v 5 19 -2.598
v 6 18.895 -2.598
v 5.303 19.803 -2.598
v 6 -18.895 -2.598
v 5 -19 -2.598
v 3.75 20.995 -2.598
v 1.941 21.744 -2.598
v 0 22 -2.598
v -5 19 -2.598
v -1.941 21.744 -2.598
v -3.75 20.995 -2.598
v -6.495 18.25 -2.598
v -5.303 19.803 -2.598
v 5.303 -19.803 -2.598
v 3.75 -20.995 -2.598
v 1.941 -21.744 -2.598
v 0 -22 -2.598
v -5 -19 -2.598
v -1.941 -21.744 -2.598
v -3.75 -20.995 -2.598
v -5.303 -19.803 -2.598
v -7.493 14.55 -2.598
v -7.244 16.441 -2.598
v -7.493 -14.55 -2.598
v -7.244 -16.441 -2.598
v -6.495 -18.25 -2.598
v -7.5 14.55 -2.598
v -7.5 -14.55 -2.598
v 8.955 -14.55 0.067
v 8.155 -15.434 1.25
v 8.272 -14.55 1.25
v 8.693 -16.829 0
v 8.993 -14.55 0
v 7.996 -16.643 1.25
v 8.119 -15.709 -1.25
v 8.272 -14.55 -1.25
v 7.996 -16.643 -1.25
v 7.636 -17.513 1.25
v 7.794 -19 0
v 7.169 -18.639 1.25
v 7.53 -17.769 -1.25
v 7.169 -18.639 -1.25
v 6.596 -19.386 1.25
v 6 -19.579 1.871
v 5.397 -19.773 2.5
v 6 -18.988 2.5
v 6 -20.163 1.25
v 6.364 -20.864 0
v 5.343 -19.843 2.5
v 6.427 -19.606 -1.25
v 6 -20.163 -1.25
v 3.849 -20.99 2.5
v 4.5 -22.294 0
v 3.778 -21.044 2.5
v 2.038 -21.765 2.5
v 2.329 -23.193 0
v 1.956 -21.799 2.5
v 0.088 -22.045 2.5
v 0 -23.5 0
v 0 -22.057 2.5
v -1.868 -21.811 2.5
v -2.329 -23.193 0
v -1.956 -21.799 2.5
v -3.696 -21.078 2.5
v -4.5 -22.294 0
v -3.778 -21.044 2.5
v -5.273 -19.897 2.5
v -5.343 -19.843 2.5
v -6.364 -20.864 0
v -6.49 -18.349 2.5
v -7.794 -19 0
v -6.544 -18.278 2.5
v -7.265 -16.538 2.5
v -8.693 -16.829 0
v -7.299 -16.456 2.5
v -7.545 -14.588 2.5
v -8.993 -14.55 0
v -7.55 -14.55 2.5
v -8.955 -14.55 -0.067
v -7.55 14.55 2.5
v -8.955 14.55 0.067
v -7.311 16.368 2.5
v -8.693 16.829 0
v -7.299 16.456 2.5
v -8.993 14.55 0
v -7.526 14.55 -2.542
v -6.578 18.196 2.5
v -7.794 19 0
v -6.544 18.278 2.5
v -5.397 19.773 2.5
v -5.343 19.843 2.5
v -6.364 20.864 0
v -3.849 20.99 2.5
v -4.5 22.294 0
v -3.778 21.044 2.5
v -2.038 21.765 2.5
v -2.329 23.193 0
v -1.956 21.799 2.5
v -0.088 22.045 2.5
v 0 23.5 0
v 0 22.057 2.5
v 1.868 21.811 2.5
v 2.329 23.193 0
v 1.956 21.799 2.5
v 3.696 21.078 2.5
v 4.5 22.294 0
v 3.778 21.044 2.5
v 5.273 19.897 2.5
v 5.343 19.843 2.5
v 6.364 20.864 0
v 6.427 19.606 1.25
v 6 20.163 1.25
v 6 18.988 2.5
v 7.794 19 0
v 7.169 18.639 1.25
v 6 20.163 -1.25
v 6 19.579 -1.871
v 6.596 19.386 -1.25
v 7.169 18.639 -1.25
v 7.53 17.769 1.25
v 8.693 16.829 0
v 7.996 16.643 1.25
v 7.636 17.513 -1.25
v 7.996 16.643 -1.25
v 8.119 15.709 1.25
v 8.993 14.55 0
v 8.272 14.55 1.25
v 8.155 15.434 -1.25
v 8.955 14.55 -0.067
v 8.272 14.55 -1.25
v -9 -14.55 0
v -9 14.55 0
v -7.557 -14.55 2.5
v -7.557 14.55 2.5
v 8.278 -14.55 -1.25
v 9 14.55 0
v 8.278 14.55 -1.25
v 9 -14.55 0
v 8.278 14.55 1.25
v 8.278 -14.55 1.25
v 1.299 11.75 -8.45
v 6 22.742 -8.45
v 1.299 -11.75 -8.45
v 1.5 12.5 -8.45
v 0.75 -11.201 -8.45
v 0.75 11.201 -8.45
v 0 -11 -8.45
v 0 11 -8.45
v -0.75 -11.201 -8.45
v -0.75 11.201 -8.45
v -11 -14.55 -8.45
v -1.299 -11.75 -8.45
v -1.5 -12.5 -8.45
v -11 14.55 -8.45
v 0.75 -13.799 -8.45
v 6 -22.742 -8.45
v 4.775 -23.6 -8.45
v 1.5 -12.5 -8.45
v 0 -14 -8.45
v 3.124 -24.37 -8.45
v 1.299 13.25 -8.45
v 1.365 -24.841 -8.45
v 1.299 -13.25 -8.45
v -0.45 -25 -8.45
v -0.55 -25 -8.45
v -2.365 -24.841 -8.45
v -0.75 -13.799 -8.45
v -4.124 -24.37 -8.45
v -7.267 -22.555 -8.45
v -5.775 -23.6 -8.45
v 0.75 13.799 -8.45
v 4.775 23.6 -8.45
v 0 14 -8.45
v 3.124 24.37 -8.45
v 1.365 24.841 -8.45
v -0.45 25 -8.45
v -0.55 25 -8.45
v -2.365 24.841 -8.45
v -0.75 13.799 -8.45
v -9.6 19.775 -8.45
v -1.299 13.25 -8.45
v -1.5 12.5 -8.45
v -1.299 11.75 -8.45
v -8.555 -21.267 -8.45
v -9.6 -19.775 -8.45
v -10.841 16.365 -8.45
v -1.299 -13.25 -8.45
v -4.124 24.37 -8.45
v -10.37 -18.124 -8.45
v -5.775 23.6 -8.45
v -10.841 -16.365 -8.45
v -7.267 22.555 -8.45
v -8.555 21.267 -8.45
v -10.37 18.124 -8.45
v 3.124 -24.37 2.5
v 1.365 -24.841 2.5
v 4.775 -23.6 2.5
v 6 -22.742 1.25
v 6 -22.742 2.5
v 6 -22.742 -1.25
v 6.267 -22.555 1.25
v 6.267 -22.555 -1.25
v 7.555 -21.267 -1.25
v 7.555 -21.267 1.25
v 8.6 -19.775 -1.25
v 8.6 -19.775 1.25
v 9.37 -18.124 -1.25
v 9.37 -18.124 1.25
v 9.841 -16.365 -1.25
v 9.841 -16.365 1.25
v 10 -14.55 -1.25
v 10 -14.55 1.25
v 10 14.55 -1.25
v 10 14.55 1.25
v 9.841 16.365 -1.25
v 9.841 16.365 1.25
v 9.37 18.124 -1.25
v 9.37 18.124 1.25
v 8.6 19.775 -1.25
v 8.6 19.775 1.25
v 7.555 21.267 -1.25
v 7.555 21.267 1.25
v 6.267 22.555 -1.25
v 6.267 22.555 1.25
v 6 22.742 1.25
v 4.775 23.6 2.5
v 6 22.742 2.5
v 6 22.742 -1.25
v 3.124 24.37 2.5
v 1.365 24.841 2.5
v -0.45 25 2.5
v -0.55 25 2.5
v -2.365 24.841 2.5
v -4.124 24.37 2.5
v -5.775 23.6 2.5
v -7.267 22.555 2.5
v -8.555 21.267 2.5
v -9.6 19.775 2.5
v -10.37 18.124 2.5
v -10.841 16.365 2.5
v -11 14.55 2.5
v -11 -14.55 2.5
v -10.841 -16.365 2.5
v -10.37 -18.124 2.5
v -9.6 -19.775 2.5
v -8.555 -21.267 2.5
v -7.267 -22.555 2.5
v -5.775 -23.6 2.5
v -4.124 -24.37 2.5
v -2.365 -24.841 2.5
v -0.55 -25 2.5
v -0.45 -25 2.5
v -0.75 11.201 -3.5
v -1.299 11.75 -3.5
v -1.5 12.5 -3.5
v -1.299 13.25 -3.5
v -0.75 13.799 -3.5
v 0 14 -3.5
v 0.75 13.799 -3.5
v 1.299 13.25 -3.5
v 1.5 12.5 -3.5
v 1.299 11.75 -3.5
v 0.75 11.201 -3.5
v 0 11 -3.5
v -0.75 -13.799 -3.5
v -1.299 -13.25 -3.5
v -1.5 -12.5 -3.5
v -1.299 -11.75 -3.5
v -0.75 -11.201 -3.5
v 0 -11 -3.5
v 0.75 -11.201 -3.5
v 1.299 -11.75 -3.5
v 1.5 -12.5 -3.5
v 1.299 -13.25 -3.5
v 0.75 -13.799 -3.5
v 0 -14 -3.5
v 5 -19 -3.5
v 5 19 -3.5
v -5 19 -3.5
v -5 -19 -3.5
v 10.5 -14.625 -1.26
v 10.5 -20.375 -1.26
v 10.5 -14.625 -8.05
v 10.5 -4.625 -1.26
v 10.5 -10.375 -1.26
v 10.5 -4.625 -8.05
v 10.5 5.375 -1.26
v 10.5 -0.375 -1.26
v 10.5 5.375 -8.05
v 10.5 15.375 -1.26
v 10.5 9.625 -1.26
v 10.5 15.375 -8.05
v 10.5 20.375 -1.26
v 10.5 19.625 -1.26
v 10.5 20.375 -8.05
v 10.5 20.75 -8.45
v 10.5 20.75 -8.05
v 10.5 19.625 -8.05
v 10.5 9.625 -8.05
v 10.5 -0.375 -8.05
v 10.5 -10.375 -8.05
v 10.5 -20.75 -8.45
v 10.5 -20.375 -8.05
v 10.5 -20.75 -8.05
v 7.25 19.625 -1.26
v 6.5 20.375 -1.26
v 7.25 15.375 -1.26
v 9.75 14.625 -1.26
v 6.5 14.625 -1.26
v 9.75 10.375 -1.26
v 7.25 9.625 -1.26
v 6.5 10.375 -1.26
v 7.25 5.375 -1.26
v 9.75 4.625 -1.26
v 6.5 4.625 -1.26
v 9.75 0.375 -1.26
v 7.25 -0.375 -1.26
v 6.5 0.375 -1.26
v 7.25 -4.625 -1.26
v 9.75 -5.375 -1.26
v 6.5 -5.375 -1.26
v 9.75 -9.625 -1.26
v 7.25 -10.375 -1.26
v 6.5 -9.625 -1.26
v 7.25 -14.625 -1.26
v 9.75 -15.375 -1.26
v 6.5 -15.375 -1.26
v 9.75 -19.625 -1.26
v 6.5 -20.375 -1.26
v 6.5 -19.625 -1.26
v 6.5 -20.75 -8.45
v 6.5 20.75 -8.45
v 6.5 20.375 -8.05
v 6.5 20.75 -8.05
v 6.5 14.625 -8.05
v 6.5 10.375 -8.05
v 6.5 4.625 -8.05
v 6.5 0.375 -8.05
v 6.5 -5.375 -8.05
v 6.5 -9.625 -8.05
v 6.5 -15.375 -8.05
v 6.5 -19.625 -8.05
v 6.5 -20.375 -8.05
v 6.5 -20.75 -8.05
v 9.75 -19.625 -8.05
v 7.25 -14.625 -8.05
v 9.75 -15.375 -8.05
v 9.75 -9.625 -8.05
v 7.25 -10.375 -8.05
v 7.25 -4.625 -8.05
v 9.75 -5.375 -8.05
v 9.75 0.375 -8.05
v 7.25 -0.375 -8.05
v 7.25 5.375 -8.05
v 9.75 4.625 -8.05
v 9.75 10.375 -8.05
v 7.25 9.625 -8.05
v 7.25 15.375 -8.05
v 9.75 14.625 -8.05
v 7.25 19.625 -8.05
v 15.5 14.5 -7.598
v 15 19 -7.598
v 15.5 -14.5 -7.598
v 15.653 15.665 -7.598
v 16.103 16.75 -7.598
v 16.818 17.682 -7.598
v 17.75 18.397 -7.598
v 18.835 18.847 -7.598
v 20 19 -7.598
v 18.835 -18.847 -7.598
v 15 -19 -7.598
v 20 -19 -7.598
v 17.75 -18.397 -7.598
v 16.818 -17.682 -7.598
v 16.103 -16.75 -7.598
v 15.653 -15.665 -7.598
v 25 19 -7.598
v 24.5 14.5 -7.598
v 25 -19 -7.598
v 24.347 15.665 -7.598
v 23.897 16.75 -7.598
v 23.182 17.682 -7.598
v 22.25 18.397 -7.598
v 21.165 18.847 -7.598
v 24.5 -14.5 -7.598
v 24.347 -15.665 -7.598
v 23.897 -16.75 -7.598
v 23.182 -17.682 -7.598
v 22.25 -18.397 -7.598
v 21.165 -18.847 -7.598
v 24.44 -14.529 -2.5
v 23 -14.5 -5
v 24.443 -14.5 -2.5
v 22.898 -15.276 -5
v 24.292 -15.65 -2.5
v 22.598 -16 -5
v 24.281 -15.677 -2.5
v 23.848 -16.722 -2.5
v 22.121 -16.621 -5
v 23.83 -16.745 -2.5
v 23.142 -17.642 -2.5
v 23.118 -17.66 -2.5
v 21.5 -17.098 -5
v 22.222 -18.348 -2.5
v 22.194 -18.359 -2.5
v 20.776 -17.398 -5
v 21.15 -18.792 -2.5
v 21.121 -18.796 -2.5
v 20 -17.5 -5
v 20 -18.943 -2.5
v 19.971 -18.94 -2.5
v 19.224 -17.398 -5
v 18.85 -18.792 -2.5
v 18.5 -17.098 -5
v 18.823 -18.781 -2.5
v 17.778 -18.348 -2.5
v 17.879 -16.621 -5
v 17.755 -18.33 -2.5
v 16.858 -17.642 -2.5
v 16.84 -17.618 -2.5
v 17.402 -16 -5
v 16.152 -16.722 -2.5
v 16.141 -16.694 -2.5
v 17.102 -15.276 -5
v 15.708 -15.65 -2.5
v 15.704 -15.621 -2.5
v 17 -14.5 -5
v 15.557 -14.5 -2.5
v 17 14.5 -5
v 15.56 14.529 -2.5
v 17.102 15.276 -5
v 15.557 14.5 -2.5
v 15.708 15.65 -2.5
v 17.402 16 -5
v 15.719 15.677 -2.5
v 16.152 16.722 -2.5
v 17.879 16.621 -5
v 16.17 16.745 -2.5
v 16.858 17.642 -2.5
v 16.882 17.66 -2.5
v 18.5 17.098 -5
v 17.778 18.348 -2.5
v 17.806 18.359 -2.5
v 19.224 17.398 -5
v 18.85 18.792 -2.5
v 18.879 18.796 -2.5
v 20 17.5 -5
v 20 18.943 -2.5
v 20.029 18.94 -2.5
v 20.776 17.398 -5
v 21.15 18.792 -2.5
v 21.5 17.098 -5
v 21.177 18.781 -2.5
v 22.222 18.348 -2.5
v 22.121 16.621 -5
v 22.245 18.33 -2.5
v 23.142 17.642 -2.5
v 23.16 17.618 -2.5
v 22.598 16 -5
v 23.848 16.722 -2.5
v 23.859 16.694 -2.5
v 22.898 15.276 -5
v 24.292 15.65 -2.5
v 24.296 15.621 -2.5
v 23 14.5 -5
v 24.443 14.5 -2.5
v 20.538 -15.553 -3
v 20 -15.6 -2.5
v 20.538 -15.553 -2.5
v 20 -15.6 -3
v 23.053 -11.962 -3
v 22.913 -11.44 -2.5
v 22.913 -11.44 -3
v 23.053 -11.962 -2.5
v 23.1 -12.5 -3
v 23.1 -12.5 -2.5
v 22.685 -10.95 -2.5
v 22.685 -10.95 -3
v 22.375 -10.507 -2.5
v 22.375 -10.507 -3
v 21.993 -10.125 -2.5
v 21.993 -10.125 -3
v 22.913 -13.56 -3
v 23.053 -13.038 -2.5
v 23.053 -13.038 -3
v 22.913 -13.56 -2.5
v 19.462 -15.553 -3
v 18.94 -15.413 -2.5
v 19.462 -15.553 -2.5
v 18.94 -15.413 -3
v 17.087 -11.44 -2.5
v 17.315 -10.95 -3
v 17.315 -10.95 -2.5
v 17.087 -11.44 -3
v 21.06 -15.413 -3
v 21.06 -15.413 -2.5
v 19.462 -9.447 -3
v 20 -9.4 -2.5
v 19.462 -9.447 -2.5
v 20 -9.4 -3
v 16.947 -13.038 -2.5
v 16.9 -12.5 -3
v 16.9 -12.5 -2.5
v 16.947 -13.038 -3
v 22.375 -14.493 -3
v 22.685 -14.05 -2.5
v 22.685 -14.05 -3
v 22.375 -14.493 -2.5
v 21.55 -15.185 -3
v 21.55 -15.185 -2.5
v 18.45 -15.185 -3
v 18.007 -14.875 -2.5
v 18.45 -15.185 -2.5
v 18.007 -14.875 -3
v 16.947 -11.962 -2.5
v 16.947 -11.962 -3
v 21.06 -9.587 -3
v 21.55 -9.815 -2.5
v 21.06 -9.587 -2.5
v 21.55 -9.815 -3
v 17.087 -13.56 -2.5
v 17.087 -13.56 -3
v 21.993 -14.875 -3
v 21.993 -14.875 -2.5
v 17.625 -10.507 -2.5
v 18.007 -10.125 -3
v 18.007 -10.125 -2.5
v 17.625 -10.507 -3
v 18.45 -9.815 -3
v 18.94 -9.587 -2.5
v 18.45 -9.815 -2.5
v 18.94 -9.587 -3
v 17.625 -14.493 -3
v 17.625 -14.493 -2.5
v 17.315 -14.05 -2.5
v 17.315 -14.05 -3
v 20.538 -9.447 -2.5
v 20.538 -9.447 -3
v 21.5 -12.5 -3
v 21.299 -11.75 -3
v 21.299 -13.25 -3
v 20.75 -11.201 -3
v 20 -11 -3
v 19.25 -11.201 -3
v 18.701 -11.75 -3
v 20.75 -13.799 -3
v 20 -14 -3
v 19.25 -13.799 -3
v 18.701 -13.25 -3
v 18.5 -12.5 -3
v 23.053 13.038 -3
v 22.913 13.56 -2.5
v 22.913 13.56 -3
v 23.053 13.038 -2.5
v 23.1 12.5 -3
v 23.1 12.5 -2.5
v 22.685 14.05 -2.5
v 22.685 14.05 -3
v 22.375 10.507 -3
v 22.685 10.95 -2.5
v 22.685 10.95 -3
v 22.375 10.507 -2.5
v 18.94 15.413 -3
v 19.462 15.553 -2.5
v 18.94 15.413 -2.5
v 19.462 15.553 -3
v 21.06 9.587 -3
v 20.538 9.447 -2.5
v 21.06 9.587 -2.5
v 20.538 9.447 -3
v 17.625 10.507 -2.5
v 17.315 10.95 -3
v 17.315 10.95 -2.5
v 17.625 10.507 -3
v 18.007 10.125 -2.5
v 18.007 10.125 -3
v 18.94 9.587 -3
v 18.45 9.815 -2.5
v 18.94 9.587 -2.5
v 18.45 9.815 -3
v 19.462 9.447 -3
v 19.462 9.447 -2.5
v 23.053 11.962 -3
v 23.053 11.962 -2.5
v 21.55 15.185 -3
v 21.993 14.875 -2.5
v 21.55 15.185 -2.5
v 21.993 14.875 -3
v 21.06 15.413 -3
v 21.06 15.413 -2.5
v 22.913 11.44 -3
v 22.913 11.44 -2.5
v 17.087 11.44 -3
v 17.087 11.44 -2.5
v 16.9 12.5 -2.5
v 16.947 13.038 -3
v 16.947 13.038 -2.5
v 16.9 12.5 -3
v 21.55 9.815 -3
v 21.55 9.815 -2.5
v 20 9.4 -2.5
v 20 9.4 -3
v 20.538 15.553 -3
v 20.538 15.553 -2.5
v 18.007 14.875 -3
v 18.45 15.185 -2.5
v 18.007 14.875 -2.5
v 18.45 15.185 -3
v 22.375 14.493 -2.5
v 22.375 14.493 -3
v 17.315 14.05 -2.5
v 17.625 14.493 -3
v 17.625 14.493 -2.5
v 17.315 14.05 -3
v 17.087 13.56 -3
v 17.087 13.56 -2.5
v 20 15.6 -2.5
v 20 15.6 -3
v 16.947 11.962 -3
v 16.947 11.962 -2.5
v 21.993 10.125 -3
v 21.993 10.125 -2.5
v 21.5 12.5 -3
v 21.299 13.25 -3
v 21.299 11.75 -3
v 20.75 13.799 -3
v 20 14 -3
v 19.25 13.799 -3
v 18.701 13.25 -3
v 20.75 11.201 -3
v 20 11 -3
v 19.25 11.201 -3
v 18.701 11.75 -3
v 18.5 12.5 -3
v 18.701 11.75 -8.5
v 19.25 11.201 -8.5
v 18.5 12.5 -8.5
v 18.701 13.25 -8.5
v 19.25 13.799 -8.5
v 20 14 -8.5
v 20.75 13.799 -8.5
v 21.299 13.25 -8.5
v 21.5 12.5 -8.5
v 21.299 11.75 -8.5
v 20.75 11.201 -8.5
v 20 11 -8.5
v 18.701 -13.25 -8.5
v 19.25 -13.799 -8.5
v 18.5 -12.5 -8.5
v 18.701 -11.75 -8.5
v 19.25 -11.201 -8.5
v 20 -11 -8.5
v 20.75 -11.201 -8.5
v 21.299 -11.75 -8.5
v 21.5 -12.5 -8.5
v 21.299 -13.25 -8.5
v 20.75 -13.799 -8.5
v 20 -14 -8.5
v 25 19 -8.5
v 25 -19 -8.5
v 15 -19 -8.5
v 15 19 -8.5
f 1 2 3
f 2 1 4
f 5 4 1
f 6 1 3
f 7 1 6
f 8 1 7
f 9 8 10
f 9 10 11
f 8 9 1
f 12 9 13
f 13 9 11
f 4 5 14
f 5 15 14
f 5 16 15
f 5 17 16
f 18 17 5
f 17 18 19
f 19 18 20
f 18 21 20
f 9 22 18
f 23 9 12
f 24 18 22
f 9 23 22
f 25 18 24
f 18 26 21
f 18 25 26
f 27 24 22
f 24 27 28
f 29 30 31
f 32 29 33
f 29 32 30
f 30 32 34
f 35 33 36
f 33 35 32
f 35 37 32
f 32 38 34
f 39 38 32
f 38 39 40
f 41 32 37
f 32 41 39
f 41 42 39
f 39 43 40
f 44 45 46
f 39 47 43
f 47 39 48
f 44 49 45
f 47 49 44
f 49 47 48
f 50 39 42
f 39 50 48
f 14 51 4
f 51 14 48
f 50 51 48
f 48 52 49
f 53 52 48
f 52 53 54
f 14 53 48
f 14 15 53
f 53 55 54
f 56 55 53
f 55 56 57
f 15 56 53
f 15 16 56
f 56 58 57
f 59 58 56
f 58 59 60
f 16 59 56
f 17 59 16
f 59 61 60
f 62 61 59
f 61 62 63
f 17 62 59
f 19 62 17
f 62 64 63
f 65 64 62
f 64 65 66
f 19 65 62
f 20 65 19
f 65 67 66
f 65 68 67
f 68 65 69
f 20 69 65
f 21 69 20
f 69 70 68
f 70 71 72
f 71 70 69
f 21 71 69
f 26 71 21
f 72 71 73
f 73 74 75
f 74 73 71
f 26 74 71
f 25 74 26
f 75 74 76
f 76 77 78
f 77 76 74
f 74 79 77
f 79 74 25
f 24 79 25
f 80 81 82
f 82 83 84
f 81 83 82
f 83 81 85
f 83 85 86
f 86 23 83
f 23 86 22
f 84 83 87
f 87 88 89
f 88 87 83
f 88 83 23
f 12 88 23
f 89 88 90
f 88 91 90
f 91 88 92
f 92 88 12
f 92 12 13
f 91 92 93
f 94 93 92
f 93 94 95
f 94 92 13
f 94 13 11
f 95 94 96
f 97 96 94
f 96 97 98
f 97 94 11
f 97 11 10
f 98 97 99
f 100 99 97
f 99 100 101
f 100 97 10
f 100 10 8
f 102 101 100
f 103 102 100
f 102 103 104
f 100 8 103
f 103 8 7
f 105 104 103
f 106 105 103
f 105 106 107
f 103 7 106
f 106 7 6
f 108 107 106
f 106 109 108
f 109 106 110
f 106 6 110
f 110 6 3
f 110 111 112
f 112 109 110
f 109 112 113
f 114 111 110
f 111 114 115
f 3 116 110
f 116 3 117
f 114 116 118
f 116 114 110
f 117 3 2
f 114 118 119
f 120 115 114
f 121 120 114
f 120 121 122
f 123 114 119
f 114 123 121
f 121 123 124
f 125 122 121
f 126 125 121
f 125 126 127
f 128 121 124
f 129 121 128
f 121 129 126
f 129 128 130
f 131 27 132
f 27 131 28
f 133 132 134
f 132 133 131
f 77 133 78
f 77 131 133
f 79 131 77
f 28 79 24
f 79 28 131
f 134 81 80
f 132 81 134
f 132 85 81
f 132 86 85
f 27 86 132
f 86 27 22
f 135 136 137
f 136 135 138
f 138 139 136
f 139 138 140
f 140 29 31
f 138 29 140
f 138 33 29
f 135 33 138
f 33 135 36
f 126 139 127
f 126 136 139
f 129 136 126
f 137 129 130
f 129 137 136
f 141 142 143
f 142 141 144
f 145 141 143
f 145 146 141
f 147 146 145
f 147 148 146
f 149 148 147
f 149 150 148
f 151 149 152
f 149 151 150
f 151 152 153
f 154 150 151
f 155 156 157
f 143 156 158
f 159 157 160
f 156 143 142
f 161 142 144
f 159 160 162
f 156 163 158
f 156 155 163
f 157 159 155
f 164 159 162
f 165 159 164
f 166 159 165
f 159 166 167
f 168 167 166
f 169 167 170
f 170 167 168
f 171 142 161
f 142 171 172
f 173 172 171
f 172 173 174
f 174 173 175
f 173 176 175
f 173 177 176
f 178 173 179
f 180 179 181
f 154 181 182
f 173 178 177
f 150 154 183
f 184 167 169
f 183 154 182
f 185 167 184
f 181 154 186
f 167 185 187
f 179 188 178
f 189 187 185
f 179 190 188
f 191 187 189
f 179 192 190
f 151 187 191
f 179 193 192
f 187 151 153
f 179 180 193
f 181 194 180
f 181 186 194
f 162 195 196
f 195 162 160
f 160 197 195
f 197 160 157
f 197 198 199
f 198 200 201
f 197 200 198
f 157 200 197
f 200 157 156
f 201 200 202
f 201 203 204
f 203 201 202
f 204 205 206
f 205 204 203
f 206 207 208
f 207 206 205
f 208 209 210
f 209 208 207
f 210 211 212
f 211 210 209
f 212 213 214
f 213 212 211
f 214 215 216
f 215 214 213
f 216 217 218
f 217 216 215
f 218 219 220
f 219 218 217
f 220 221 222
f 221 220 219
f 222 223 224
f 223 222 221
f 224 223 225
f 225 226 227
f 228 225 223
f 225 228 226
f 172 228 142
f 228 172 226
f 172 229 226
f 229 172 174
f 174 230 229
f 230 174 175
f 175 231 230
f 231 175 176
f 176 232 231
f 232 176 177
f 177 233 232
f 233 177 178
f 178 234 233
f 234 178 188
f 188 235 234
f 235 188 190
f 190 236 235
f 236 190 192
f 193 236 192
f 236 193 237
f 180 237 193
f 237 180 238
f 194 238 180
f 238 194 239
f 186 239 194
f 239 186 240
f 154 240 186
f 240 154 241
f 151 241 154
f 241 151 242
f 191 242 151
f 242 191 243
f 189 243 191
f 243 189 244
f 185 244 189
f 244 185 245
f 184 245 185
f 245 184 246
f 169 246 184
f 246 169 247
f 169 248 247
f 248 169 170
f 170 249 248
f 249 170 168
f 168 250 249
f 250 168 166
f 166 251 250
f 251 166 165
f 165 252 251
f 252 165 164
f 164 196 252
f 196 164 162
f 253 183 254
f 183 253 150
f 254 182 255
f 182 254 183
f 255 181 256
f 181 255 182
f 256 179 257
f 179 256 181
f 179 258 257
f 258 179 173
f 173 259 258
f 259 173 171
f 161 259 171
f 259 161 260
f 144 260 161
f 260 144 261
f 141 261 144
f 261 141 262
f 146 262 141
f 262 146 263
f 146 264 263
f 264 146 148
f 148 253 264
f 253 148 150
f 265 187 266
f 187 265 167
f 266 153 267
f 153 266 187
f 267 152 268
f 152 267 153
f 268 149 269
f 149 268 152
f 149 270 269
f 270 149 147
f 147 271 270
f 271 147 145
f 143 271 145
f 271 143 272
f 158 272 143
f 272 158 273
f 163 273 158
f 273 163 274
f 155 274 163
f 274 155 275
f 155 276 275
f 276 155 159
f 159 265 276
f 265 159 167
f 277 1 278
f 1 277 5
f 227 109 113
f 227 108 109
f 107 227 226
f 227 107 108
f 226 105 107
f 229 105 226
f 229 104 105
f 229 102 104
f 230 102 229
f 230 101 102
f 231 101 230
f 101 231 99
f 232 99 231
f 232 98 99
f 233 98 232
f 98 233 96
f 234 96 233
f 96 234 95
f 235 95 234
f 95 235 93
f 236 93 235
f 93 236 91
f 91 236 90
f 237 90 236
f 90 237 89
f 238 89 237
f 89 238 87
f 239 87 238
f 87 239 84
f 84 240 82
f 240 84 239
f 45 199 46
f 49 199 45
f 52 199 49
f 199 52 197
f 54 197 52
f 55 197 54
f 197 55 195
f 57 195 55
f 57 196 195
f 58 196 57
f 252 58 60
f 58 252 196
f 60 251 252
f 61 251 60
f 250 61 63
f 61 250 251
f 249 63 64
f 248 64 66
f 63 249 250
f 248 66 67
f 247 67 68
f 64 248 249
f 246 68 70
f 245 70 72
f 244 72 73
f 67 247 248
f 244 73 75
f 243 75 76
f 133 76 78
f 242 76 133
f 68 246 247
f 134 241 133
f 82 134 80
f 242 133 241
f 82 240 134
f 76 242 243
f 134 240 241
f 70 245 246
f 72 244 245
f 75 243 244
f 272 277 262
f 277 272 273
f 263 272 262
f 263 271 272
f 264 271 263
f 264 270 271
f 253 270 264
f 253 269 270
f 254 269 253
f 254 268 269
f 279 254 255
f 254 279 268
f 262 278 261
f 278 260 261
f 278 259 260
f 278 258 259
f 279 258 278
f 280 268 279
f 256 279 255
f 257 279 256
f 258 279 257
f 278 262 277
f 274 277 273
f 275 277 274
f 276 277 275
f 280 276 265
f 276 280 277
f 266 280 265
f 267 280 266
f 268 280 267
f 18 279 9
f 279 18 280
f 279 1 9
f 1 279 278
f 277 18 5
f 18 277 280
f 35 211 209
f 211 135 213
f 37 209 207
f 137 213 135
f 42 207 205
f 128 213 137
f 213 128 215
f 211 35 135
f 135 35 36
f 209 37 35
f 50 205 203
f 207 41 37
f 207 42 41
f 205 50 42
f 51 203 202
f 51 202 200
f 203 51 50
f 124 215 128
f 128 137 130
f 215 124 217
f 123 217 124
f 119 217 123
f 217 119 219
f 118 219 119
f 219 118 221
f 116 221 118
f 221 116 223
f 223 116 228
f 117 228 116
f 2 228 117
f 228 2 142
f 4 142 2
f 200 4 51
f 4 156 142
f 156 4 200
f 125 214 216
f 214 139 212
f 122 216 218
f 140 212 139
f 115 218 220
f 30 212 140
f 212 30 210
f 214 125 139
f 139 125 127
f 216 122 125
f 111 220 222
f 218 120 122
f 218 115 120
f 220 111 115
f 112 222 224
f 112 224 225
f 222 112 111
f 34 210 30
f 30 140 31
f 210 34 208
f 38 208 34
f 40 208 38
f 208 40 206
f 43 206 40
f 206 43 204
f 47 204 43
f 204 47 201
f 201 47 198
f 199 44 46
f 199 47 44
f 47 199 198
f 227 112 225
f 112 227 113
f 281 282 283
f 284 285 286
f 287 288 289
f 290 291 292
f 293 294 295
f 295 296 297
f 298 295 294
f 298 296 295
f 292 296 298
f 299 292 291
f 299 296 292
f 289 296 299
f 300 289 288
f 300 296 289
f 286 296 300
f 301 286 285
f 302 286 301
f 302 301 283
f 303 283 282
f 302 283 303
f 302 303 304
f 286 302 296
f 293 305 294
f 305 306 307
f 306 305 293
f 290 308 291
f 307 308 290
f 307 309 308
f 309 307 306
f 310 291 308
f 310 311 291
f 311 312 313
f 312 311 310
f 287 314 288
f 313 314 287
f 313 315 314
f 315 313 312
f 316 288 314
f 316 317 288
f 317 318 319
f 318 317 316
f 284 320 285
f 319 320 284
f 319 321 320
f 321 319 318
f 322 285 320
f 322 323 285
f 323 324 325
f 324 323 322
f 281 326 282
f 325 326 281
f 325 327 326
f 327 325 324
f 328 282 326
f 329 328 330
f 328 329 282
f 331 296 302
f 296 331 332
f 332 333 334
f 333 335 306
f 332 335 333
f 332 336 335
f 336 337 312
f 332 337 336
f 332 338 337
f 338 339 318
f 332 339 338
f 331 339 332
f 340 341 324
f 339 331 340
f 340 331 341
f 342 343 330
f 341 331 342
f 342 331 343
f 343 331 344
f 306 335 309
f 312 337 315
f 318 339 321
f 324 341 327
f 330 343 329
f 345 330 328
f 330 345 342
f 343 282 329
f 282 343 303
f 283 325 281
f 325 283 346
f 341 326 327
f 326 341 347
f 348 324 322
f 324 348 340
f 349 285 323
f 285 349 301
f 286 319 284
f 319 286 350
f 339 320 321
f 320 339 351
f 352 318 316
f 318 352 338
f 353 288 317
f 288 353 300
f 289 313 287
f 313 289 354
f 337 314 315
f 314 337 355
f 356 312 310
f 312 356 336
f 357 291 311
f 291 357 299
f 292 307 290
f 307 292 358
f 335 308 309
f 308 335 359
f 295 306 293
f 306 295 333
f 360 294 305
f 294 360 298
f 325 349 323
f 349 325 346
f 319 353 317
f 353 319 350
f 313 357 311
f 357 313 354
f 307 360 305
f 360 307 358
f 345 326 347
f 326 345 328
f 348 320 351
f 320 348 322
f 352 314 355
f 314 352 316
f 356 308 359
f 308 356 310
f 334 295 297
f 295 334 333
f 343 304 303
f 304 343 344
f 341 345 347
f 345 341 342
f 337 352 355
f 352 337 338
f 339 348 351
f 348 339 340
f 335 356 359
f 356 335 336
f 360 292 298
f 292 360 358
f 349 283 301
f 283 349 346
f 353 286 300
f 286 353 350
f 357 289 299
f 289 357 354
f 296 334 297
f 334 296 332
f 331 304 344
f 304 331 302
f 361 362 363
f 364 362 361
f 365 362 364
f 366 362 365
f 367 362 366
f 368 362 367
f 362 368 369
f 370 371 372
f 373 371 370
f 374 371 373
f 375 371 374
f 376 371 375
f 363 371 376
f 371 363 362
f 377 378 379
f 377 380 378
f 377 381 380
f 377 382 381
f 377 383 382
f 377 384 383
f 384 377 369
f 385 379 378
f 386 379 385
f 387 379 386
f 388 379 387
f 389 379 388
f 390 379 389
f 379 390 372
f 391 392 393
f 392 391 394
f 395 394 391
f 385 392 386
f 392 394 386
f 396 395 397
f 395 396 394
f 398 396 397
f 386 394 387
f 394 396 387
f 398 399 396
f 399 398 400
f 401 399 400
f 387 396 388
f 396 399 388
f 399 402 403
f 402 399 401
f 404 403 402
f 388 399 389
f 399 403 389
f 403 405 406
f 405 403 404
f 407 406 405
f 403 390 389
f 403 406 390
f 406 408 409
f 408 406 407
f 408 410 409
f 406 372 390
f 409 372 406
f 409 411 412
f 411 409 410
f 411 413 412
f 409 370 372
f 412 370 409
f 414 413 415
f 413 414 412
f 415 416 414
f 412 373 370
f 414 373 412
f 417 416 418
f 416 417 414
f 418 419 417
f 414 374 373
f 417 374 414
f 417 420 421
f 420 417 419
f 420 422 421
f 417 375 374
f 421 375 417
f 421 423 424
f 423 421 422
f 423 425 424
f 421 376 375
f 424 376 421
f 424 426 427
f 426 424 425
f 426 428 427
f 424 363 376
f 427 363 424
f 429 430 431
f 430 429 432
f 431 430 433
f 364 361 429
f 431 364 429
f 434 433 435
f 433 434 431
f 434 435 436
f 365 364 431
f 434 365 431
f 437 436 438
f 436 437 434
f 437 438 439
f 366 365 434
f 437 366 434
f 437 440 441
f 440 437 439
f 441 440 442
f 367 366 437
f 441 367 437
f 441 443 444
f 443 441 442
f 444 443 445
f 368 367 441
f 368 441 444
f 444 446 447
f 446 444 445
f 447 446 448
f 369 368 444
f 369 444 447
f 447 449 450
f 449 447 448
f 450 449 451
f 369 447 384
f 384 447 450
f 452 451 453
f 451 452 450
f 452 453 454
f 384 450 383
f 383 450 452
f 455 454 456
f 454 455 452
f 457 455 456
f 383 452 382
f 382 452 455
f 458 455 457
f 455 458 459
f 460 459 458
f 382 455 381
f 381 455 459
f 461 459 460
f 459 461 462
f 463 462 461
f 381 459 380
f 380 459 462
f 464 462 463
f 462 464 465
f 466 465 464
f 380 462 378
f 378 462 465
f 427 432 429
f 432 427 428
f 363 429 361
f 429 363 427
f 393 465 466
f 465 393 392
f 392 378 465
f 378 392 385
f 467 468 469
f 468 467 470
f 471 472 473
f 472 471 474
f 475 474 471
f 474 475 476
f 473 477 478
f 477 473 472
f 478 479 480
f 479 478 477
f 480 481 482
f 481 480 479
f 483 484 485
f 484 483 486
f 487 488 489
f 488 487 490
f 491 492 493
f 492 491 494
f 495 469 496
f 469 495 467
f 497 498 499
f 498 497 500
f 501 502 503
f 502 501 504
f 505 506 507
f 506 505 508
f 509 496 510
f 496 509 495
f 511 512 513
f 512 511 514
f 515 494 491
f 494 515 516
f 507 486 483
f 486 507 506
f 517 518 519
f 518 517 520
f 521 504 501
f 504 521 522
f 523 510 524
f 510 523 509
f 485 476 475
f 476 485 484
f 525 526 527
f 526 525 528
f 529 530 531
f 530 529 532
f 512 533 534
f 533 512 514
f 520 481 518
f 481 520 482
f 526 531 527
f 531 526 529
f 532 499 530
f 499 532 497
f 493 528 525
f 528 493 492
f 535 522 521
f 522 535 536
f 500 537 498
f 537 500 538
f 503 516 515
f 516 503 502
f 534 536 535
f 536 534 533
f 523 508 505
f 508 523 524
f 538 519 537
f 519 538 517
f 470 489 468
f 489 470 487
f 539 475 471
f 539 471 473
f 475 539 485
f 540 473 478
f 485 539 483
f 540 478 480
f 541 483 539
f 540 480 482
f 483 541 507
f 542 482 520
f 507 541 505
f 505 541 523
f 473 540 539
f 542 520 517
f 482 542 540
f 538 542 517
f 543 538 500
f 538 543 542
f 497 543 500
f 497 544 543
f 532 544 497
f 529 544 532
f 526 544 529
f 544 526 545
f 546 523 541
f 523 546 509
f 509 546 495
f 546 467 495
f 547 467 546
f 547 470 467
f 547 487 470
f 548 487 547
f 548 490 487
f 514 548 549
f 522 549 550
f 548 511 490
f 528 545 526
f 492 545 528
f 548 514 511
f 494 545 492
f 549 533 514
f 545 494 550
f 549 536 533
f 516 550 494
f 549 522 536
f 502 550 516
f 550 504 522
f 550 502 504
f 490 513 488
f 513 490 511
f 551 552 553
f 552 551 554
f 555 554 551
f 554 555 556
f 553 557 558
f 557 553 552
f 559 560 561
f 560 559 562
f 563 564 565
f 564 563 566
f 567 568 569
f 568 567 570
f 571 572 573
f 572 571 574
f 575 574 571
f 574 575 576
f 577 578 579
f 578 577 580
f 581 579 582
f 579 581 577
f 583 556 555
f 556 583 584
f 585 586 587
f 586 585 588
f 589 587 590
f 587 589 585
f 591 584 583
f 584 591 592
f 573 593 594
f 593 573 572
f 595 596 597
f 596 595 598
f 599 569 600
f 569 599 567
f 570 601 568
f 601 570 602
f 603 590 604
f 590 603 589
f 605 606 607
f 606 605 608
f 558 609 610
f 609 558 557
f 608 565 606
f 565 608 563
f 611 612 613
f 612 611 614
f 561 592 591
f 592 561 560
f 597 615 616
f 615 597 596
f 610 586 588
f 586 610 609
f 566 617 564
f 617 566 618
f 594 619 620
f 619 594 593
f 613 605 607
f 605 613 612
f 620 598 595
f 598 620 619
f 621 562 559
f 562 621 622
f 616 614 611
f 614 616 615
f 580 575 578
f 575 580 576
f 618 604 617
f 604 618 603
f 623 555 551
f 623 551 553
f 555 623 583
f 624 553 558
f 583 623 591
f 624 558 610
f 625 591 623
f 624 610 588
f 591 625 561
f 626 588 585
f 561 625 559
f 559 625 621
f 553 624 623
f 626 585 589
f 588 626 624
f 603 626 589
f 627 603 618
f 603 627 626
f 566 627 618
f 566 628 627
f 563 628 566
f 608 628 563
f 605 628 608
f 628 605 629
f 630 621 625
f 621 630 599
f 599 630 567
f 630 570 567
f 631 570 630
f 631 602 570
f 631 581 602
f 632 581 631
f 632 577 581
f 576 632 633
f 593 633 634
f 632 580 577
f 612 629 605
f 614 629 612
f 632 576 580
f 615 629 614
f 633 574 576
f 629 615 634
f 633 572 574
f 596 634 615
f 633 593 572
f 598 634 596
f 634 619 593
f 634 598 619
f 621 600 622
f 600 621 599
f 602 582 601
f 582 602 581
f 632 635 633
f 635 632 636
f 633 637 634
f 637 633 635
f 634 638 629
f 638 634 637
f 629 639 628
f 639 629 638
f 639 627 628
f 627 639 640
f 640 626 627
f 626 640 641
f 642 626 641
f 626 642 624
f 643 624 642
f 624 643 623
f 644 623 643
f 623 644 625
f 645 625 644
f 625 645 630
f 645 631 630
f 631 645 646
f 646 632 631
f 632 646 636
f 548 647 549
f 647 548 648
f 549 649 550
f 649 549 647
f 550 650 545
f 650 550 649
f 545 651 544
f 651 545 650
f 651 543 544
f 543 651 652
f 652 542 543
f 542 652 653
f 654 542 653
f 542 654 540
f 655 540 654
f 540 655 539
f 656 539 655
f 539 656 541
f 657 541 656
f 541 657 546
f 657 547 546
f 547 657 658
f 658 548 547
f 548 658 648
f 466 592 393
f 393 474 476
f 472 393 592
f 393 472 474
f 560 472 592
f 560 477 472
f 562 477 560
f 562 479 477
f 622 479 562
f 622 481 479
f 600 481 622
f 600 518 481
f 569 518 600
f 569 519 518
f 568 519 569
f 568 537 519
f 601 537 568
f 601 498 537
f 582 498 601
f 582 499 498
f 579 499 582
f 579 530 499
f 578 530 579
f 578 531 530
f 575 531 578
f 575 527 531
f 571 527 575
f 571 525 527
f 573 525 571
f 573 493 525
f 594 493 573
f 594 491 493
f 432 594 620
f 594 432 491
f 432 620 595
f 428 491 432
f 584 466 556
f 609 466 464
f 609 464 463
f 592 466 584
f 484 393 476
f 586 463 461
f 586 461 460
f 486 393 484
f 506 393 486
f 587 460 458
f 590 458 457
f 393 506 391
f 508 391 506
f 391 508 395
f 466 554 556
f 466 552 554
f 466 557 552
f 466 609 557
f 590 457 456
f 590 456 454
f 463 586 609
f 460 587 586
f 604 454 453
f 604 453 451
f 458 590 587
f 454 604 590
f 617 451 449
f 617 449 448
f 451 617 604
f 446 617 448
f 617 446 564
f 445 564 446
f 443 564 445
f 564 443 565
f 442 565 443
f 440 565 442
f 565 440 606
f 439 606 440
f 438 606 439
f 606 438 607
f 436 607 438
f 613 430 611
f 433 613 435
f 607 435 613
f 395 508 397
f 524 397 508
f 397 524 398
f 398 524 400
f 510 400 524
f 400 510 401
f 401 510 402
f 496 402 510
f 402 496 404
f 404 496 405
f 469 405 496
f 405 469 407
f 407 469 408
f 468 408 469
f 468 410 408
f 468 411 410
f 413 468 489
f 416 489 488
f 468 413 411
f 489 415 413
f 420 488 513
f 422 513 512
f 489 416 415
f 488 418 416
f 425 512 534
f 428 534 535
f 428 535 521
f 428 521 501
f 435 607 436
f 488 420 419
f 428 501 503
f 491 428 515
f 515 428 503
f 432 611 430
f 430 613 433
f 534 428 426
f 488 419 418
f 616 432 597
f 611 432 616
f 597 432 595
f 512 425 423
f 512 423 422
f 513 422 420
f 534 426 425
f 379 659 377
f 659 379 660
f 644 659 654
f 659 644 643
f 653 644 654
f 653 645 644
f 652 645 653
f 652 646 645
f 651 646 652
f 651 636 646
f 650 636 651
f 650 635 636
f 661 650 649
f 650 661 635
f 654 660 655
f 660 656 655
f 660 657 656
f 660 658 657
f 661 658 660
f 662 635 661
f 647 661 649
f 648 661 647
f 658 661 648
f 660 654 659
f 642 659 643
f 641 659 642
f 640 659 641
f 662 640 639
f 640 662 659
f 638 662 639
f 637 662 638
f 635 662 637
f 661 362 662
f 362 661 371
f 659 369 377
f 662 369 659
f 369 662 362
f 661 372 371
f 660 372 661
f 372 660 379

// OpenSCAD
// file: recirculating_mw.scad
//include </home/markw/Dropbox/3Dmodels/MCAD/nuts_and_bolts.scad>

length = 50;
thickness = 11;
channel_radius = 3;
track_radius = 6;
outside_radius = channel_radius + track_radius + 1.5;
slot = 2.5;

module track(h) {
  union() {
    translate([0, outside_radius-length/2, 0]) intersection() {
      rotate_extrude($fn=24) translate([track_radius, 0, 0])
        circle(r=channel_radius, $fn=6);
      translate([0, -20, 0]) cube([40, 40, 40], center=true);
    }
    translate([0, length/2-outside_radius, 0]) intersection() {
      rotate_extrude($fn=24) translate([track_radius, 0, 0])
        circle(r=channel_radius, $fn=6);
      translate([0, 20, 0]) cube([40, 40, 40], center=true);
    }
    for (s = [-1, 1]) {
      scale([s, 1, 1])
        translate([track_radius, 0, 0]) rotate([90, 0, 0]) {
          cylinder(r=channel_radius,
                   h=length-2*outside_radius+0.1,
                   center=true, $fn=6);
          translate([0, 2, 0]) #
            cylinder(r=channel_radius*0.61,
                     h=length-2*outside_radius+0.1,
                     center=true, $fn=6);
      }
    }
  }
}

module half() {
  difference() {
    translate([0, 0, slot/2-thickness+1.3])
    linear_extrude(height=30, convexity=2) {
      difference() {
        translate([-0.5, 0, 0]) minkowski() {
          square([0.1, 0.1+length-2*outside_radius], center=true);
          circle(r=outside_radius-0.05, $fn=36);
        }
        for (y = [2+outside_radius-length/2,
                  length/2-outside_radius-2]) {
          translate([0, y])
            circle(r=1.5, $fn=12);
        }
      }
    }
    track();
    translate([-10.5, 0, 12.5])
      cube([100, 100, 20], center=true);
    translate([0, 0, 10]) rotate([0, -90, 0]) {
      rotate([0, 0, 90]) cylinder(r=3.2, h=50, $fn=6);
      cylinder(r=1.7, h=50, center=true, $fn=12);
    }
    translate([10+track_radius, 0, -10-slot/2])
      cube([20, length, 20], center=true);
    translate([10+track_radius, 0, 10+slot/2])
      cube([20, length, 20], center=true);
    // recesses for bolt heads
    assign(bhr = 1)
    for (y = [2+outside_radius-length/2,
              length/2-outside_radius-2]) {
      translate([0, y, 3-bhr])
        cylinder(r=3.1, h=bhr, $fn=36);
    }
  }
}

channelHeight = -1 + 2 * channel_radius;
cutDepth = 1;

module inner_half() {
    translate([0, 0, -5])
    intersection() {
        half();
        // remove inner part of track to eliminate travel moves
        translate([0, 0, -cutDepth/2])
          cube([10, 38, channelHeight+cutDepth], center=true);
    }
}

module outer_half() {
  difference() {
    translate([0, 0, slot/2-thickness+1.3])
    linear_extrude(height=30, convexity=2) {
      difference() {
        translate([-0.5, 0, 0]) minkowski() {
          square([0.1, 0.1+length-2*outside_radius], center=true);
          circle(r=outside_radius-0.05, $fn=36);
        }
        for (y = [2+outside_radius-length/2,
                  length/2-outside_radius-2]) {
          translate([0, y])
            circle(r=1.5, $fn=12);
        }
      }
    }
    track();

    // remove inner part of track to eliminate travel moves
    translate([0, 0, -cutDepth/2])
      cube([10, 38, channelHeight+cutDepth], center=true);
      
    translate([-10.5, 0, 12.5])
      cube([100, 100, 20], center=true);
    translate([0, 0, 10]) rotate([0, -90, 0]) {
      rotate([0, 0, 90]) cylinder(r=3.2, h=50, $fn=6);
      cylinder(r=1.7, h=50, center=true, $fn=12);
    }
    translate([10+track_radius, 0, -10-slot/2])
      cube([20, length, 20], center=true);
    translate([10+track_radius, 0, 10+slot/2])
      cube([20, length, 20], center=true);
    // recesses for bolt heads
    assign(bhr = 1)
    for (y = [2+outside_radius-length/2,
              length/2-outside_radius-2]) {
      translate([0, y, 3-bhr])
        cylinder(r=3.1, h=bhr, $fn=36);
    }
  }
}

module recirc_plate(bearing_offset, recess=0.5) {
    width = 42;
    height = 42;
    thickness = 12;
    sdepth = 9;
    slotwidth = 1;
    soffset = (bearing_offset-10)/2;
    tdepth = .4 * sdepth;
    tol = 0.25;
    cutout = 10;
    difference() {
        // locate top face of plate at z=0
        translate([0,0,-thickness/2])
            cube([width, height, thickness], center=true);
        // cut slots for tensioning adjustment
        translate([bearing_offset-soffset,0,-sdepth/2])
            cube([slotwidth, height, sdepth], center=true);
        translate([-bearing_offset+soffset,0,-sdepth/2])
            cube([slotwidth, height, sdepth], center=true);
        // shave recess off center section
        translate([0,0,-recess/2])
            cube([2*(bearing_offset-soffset), height, recess], center=true);
        // hollow out center section 
        translate([0,0,-(sdepth-2)/2])
            cube([cutout, (height-6), sdepth-2], center=true);
        // carriage mounting holes (clearance)
        for(xoff=[-10,10]) {
            for(yoff=[-10,10]) {
                // M3 bolt
                translate([xoff, yoff, -thickness])
                    cylinder(r=1.5, h=thickness, $fn=36);
                // M3 nut
                translate([xoff, yoff, -sdepth]) rotate([0,0,30])
                    cylinder(r=3+tol, h=thickness, $fn=6);
            }
        }
        // recirc bearing mtg holes (clearance M3)
        for(xoff=[-bearing_offset, bearing_offset]) {
            for(yoff=[-12.5, 12.5]) {
                // .5 mm thick bridge at bottom of hole must be drilled out
                translate([xoff, yoff, 3.5-thickness])
                    cylinder(r=1.5, h=thickness, $fn=36);
                // M3 nut
                translate([xoff, yoff, -thickness])
                    cylinder(r=3+tol, h=2.5, $fn=6);
            }
        }
        // tensioning screw 
        // nuts (tolerance is added to radius of nuts)
        translate([-1.9-cutout/2, 0, -tdepth]) rotate([0, 90, 0]) rotate([0, 0, 30])
            cylinder(r=3+tol, h=2, $fn=6);
        translate([-.1+cutout/2, 0, -tdepth]) rotate([0, 90, 0]) rotate([0, 0, 30])
            cylinder(r=3+tol, h=2, $fn=6);
        // bolts
        translate([0, 0, -tdepth]) rotate([0, 90, 0])
            cylinder(r=3/2, h=width+2, $fn=36, center=true);
    }
}

module recirc_half() {
    outer_half();
    
    // support
    swid = 4;
    stk = 0.75;
    soff = 6.5;
    gap = 0.01;
    shgt = thickness-slot-1.3-gap;
    
    echo("recirc bearing bottom z offset:", -gap-shgt-slot/2);
    
    translate([soff+swid/2, 0, .2-gap-shgt-slot/2]) 
        cube([swid, 40+2*stk, .4], center=true);
        
    for (y = [-20: 5: 20]) {
        translate([soff+swid/2, y, -gap-(shgt+slot)/2]) 
            cube([swid, stk, shgt], center=true);
    }
    for (y = [-15: 10: 15]) {
        translate([soff+stk/2, y+5/2, -gap-(shgt+slot)/2]) 
            cube([stk, 5, shgt], center=true);
    }
    for (y = [-15: 10: 15]) {
        translate([soff+swid-stk/2, y-5/2, -gap-(shgt+slot)/2]) 
            cube([stk, 5, shgt], center=true);
    }
}
// main file
include <recirculating_mw.scad>
recirc_half();
translate([20, 0, 0]) inner_half();

//
//translate([29, 0, 0]) rotate([0,0,180]) % recirc_half();
//
//// extrusion
//xwid = 15;
//translate([xwid/2, -50, -xwid/2]) 
//    % cube([15, 100, 15]);
//
//// carriage plate
//translate([15,0,-thickness+slot])
//    % recirc_plate(14.5);
//
